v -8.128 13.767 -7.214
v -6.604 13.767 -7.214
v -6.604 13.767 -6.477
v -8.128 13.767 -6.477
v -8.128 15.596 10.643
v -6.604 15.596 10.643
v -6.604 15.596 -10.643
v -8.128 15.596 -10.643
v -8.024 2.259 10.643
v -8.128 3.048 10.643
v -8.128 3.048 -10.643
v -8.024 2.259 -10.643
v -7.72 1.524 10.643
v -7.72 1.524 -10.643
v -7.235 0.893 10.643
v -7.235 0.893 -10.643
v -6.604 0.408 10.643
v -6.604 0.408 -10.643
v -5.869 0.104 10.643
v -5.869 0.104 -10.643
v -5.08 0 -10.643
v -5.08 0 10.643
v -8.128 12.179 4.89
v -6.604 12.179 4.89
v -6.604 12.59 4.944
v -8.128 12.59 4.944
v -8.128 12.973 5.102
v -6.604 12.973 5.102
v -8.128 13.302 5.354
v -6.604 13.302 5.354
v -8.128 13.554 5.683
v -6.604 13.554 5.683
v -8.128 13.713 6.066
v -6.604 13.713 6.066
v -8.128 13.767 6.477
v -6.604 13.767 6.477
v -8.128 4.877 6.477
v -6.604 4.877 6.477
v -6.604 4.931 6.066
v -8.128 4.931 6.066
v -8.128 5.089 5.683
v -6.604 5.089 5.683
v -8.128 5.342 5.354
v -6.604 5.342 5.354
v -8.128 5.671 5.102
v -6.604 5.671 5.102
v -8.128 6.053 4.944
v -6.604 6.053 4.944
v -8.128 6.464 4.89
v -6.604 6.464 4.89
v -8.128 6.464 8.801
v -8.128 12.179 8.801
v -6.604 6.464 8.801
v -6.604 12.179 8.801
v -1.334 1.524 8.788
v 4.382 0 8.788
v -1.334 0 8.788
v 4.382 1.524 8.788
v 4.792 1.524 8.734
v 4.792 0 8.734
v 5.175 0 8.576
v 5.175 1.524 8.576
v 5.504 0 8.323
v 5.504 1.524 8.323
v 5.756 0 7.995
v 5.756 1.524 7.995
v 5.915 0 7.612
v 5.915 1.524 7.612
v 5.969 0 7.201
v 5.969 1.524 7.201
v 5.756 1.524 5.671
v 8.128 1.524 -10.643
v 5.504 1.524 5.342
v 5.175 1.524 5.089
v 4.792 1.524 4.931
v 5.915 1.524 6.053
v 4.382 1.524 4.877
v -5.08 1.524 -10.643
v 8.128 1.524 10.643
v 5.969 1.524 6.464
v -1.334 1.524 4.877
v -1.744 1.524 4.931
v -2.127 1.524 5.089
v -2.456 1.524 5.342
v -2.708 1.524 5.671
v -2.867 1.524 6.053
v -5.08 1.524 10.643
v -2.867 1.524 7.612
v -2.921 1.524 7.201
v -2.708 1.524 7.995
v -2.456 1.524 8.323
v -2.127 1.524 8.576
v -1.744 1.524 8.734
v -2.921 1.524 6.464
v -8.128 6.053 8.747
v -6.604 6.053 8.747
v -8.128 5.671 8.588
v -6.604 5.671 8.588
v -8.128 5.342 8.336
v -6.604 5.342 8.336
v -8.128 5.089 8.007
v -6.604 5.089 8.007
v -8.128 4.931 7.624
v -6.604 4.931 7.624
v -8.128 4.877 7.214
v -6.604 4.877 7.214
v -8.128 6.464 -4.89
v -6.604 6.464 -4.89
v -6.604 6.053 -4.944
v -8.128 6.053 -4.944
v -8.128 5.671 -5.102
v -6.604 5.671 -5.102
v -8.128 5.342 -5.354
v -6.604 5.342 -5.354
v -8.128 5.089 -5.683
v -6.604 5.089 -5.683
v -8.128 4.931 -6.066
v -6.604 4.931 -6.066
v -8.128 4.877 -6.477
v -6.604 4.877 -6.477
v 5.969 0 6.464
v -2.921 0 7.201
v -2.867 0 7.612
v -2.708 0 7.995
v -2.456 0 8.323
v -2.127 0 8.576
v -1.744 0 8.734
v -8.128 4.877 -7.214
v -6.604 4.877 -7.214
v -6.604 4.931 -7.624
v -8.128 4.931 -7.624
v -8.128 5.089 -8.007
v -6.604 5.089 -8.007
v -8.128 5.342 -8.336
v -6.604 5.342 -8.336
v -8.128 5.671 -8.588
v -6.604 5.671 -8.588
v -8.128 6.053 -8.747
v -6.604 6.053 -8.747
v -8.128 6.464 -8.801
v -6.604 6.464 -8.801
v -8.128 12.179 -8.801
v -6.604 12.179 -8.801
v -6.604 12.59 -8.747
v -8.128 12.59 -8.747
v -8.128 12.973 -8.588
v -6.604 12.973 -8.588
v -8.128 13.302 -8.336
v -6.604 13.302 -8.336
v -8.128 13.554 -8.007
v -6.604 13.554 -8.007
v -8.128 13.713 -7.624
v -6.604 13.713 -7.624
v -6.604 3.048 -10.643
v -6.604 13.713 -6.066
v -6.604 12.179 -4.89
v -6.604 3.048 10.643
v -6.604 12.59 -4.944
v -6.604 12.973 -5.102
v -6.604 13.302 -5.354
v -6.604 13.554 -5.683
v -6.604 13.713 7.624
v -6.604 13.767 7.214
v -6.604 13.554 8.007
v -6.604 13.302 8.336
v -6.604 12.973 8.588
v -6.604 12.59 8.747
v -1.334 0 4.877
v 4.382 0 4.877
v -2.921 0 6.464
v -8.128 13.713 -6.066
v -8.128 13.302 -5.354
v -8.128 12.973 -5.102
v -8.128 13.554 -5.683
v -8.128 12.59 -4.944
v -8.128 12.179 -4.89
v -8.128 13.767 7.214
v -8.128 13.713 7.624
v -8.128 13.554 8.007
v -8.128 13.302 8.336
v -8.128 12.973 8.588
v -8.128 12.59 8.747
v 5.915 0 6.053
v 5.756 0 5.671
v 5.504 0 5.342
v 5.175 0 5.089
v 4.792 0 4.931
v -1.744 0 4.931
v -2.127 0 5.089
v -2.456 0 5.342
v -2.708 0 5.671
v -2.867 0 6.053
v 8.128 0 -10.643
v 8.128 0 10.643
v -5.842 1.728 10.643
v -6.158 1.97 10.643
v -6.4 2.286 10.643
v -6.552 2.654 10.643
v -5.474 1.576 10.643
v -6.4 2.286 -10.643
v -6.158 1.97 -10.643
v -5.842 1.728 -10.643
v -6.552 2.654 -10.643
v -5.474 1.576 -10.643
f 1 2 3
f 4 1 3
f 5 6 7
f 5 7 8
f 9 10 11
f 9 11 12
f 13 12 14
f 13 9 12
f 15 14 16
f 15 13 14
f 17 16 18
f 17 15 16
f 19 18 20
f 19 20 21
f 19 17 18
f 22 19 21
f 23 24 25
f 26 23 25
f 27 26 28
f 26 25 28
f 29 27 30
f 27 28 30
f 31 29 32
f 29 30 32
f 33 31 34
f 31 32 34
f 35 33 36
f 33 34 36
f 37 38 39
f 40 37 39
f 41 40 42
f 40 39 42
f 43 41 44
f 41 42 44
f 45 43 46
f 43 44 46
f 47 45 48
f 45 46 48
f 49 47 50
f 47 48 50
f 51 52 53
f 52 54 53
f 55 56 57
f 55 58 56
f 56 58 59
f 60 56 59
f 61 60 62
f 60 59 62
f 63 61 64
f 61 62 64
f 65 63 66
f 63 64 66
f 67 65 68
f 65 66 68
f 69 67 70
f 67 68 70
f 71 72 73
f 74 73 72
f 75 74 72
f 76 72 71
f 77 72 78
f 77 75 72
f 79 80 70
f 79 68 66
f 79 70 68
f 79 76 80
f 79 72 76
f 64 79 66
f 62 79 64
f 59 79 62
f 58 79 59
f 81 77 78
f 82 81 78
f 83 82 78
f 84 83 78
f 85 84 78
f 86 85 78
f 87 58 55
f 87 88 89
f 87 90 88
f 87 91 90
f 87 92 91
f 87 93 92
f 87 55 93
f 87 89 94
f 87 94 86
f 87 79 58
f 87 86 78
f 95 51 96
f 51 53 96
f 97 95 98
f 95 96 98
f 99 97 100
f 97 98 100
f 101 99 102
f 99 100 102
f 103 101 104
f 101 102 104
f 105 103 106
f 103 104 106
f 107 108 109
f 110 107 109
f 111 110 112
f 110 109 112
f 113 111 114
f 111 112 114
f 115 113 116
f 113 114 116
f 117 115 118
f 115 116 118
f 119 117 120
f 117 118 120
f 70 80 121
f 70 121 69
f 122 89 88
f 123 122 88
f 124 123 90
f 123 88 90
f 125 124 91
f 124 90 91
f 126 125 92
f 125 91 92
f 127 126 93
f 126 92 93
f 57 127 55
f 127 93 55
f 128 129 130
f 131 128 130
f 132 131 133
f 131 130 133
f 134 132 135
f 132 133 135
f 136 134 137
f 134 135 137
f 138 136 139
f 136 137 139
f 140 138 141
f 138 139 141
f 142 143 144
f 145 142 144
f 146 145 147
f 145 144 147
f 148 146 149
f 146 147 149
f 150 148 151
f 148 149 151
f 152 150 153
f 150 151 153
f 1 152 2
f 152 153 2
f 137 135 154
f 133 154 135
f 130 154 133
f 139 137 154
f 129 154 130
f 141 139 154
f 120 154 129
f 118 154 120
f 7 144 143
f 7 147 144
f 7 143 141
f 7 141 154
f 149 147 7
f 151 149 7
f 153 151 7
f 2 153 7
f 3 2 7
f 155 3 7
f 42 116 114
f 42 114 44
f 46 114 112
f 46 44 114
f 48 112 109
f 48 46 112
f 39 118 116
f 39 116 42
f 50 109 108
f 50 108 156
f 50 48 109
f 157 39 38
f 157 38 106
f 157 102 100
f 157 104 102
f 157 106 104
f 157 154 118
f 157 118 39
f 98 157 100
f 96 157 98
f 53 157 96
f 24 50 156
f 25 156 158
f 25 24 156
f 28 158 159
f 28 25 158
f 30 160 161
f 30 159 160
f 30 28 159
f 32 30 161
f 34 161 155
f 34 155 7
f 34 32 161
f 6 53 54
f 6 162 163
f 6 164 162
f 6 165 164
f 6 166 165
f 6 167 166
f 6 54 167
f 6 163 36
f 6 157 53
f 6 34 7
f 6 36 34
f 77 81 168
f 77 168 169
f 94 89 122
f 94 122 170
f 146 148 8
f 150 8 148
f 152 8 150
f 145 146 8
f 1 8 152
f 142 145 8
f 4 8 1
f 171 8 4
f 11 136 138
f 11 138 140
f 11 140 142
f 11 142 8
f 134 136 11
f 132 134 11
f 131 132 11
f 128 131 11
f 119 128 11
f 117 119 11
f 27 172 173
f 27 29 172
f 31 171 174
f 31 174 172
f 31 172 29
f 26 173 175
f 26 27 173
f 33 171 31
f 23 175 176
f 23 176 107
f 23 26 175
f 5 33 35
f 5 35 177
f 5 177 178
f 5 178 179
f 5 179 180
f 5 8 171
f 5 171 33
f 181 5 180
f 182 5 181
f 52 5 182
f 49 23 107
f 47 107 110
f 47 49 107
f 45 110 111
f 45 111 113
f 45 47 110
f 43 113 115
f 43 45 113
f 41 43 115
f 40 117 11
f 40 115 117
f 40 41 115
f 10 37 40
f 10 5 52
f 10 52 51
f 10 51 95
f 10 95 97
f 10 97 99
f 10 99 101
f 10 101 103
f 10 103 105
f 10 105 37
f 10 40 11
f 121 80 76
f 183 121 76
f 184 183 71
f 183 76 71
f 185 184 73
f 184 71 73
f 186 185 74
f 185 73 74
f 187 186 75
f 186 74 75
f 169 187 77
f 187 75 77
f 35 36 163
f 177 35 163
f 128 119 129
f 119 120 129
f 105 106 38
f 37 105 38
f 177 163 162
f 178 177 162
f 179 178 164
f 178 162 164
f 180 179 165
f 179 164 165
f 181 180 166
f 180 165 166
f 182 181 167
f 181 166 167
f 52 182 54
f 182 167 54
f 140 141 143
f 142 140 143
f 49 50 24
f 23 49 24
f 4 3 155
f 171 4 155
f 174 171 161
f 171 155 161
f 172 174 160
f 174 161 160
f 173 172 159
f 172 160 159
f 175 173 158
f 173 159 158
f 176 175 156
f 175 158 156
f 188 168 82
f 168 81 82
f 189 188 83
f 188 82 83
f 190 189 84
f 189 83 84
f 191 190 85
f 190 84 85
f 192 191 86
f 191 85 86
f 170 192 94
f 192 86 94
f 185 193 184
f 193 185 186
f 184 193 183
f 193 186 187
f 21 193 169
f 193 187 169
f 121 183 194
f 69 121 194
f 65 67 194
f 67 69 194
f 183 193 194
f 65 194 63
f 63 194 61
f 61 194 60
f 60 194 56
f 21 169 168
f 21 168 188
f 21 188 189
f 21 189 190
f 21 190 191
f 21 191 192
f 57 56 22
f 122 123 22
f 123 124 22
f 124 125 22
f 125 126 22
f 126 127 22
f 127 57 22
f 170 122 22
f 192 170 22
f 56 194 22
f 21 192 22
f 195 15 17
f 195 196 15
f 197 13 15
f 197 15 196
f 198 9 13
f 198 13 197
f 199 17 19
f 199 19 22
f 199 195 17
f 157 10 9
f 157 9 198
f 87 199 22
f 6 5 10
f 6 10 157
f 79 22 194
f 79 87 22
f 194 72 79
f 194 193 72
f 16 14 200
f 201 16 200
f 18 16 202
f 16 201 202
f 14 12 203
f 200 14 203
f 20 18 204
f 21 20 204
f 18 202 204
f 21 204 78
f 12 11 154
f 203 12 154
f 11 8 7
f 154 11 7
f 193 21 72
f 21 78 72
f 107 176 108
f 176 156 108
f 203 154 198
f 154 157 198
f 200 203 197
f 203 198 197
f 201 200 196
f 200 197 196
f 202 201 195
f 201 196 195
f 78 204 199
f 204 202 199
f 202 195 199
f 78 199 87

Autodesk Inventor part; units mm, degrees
ref_plane "YZ Plane" through (0, 0, 0) normal (1, 0, 0) x (0, 1, 0)
ref_plane "XZ Plane" through (0, 0, 0) normal (0, 1, 0) x (-1, 0, 0)
ref_plane "XY Plane" through (0, 0, 0) normal (0, 0, 1) x (1, 0, 0)
sketch "Sketch1" plane through (0, 0, 0) normal (0, 1, 0) x (-1, 0, 0)
  line L0 (-8.128, 10.6426) -> (8.128, 10.6426)
  line L1 (8.128, 10.6426) -> (8.128, -10.6426)
  line L2 (8.128, -10.6426) -> (-8.128, -10.6426)
  line L3 (-8.128, -10.6426) -> (-8.128, 10.6426)
  line L4 (-8.128, 10.6426) -> (8.128, -10.6426) construction
  line L5 (8.128, 10.6426) -> (-8.128, -10.6426) construction
  point P0 (0, 0)
  dimension "d0" = 21.2852
  dimension "d1" = 16.256
extrude "Plate1" add sketch "Sketch1" along normal blind 1.524
sketch "Sketch2" plane through (-6.604, 0, 10.6426) normal (-1, 0, 0) x (0, -1, 0)
  line L0 (0, -21.2852) -> (0, 0)
  line L1 (0, 0) -> (-15.5956, 0)
  line L2 (-15.5956, 0) -> (-15.5956, -21.2852)
  line L3 (-15.5956, -21.2852) -> (0, -21.2852)
edge flange "Flange1" height 15.5956 angle 90 thickness 1.524 bend radius 1.524 thickness toward (-1, 0, 0) relief tear relief width 1.524 relief depth 0.762 edges at (-8.128, 1.524, 0) wall of the first edge with corners at (-6.604, 0, -10.6426) (-6.604, 0, 10.6426) (-6.604, 15.5956, 10.6426) (-6.604, 15.5956, -10.6426)
bend "Bend1"
corner "Corner1"
sketch "Sketch3" plane through (-6.604, 15.5956, 10.6426) normal (1, 0, 0) x (0, 0, -1)
  line L0 (0, 0) -> (0, -12.5476) construction
  line L1 (21.2852, -12.5476) -> (21.2852, 0) construction
  circle A0 centre (3.7973, -6.2738) radius 1.5875 construction
  circle A1 centre (17.4879, -6.2738) radius 1.5875 construction
  line L2 (3.7973, -6.2738) -> (17.4879, -6.2738) construction
  line L3 (21.2852, 0) -> (0, 0) construction
  line L4 (10.6426, 0) -> (10.6426, -12.5476) construction
  line L5 (0, -12.5476) -> (21.2852, -12.5476) construction
  line L6 (17.1196, -10.7188) -> (17.8562, -10.7188)
  line L7 (19.4437, -9.1313) -> (19.4437, -3.4163)
  line L8 (17.8562, -1.8288) -> (17.1196, -1.8288)
  line L9 (15.5321, -3.4163) -> (15.5321, -9.1313)
  line L10 (15.5321, -10.7188) -> (19.4437, -1.8288) construction
  line L11 (19.4437, -10.7188) -> (15.5321, -1.8288) construction
  arc A2 (17.1196, -1.8288) -> (15.5321, -3.4163) centre (17.1196, -3.4163) ccw
  arc A3 (19.4437, -3.4163) -> (17.8562, -1.8288) centre (17.8562, -3.4163) ccw
  arc A4 (15.5321, -9.1313) -> (17.1196, -10.7188) centre (17.1196, -9.1313) ccw
  arc A5 (17.8562, -10.7188) -> (19.4437, -9.1313) centre (17.8562, -9.1313) ccw
  line L12 (3.429, -10.7188) -> (4.1656, -10.7188)
  line L13 (5.7531, -9.1313) -> (5.7531, -3.4163)
  line L14 (4.1656, -1.8288) -> (3.429, -1.8288)
  line L15 (1.8415, -3.4163) -> (1.8415, -9.1313)
  line L16 (1.8415, -10.7188) -> (5.7531, -1.8288) construction
  line L17 (5.7531, -10.7188) -> (1.8415, -1.8288) construction
  arc A6 (3.429, -1.8288) -> (1.8415, -3.4163) centre (3.429, -3.4163) ccw
  arc A7 (5.7531, -3.4163) -> (4.1656, -1.8288) centre (4.1656, -3.4163) ccw
  arc A8 (4.1656, -10.7188) -> (5.7531, -9.1313) centre (4.1656, -9.1313) ccw
  arc A9 (1.8415, -9.1313) -> (3.429, -10.7188) centre (3.429, -9.1313) ccw
  point P0 (10.6426, -15.5956)
  point P1 (10.6426, -6.2738)
  dimension "d13" = 13.6906
  dimension "d14" = 3.175
  dimension "d15" = 3.175
  dimension "d16" = 3.9116
  dimension "d17" = 8.89
  dimension "d18" = 1.5875
  dimension "d19" = 3.9116
  dimension "d20" = 8.89
  dimension "d21" = 1.5875
sketch "Sketch4" plane through (0, 1.524, 0) normal (0, 1, 0) x (1, 0, 0)
  line L0 (-5.08, 10.6426) -> (8.128, 10.6426) construction
  line L1 (4.3815, 4.8768) -> (-1.3335, 4.8768) construction
  line L2 (-2.921, 6.4643) -> (-2.921, 7.2009) construction
  line L3 (-1.3335, 8.7884) -> (4.3815, 8.7884) construction
  line L4 (5.969, 7.2009) -> (5.969, 6.4643) construction
  arc A0 (-2.921, 6.4643) -> (-1.3335, 4.8768) centre (-1.3335, 6.4643) ccw construction
  arc A1 (-1.3335, 8.7884) -> (-2.921, 7.2009) centre (-1.3335, 7.2009) ccw construction
  arc A2 (4.3815, 4.8768) -> (5.969, 6.4643) centre (4.3815, 6.4643) ccw construction
  arc A3 (5.969, 7.2009) -> (4.3815, 8.7884) centre (4.3815, 7.2009) ccw construction
  line L5 (8.128, 10.6426) -> (8.128, -10.6426) projected
  line L6 (1.524, 4.8768) -> (1.524, 8.7884) construction
  line L7 (4.3815, -8.7884) -> (-1.3335, -8.7884)
  line L8 (-2.921, -7.2009) -> (-2.921, -6.4643)
  line L9 (-1.3335, -4.8768) -> (4.3815, -4.8768)
  line L10 (5.969, -6.4643) -> (5.969, -7.2009)
  arc A4 (-2.921, -7.2009) -> (-1.3335, -8.7884) centre (-1.3335, -7.2009) ccw
  arc A5 (-1.3335, -4.8768) -> (-2.921, -6.4643) centre (-1.3335, -6.4643) ccw
  arc A6 (4.3815, -8.7884) -> (5.969, -7.2009) centre (4.3815, -7.2009) ccw
  arc A7 (5.969, -6.4643) -> (4.3815, -4.8768) centre (4.3815, -6.4643) ccw
  line L11 (1.524, -8.7884) -> (1.524, -4.8768) construction
  line L12 (8.128, -10.6426) -> (-5.08, -10.6426) construction
  point P0 (0, 0)
  point P1 (1.524, 6.8326)
  point P2 (1.524, -6.8326)
  dimension "d26" = 1.5875
  dimension "d32" = 3.9116
  dimension "d33" = 8.89
  dimension "d34" = 6.604
  dimension "d35" = 3.81
  dimension "d36" = 1.5875
  dimension "d37" = 3.9116
  dimension "d38" = 8.89
  dimension "d39" = 3.81
  dimension "d40" = 6.604
extrude "Extrusion1" cut sketch "Sketch3" against normal through all
extrude "Extrusion3" cut sketch "Sketch4" against normal through all
equation "\"d3\" = BendReliefWidth"
equation "\"d4\" = BendReliefDepth"
equation "\"d5\" = MinimumRemnant"
equation "\"d6\" = BendRadius"
equation "\"d9\" = BendRadius"
equation "\"d10\" = CornerReliefSize"
equation "\"d11\" = GapSize"
equation "\"d12\" = JacobiRadiusSize"
equation "\"BendRadius\" = Thickness"
equation "\"BendReliefWidth\" = Thickness"
equation "\"BendReliefDepth\" = 0.5 * Thickness"
equation "\"CornerReliefSize\" = 4 * Thickness"
equation "\"MinimumRemnant\" = 2 * Thickness"
equation "\"TransitionRadius\" = BendRadius"
equation "\"JacobiRadiusSize\" = BendRadius"
equation "\"GapSize\" = Thickness"
equation "\"d2\" = BendRadius"
equation "\"Thickness\" = 1.524"
properties part number "mezzanineBracketLeft"
